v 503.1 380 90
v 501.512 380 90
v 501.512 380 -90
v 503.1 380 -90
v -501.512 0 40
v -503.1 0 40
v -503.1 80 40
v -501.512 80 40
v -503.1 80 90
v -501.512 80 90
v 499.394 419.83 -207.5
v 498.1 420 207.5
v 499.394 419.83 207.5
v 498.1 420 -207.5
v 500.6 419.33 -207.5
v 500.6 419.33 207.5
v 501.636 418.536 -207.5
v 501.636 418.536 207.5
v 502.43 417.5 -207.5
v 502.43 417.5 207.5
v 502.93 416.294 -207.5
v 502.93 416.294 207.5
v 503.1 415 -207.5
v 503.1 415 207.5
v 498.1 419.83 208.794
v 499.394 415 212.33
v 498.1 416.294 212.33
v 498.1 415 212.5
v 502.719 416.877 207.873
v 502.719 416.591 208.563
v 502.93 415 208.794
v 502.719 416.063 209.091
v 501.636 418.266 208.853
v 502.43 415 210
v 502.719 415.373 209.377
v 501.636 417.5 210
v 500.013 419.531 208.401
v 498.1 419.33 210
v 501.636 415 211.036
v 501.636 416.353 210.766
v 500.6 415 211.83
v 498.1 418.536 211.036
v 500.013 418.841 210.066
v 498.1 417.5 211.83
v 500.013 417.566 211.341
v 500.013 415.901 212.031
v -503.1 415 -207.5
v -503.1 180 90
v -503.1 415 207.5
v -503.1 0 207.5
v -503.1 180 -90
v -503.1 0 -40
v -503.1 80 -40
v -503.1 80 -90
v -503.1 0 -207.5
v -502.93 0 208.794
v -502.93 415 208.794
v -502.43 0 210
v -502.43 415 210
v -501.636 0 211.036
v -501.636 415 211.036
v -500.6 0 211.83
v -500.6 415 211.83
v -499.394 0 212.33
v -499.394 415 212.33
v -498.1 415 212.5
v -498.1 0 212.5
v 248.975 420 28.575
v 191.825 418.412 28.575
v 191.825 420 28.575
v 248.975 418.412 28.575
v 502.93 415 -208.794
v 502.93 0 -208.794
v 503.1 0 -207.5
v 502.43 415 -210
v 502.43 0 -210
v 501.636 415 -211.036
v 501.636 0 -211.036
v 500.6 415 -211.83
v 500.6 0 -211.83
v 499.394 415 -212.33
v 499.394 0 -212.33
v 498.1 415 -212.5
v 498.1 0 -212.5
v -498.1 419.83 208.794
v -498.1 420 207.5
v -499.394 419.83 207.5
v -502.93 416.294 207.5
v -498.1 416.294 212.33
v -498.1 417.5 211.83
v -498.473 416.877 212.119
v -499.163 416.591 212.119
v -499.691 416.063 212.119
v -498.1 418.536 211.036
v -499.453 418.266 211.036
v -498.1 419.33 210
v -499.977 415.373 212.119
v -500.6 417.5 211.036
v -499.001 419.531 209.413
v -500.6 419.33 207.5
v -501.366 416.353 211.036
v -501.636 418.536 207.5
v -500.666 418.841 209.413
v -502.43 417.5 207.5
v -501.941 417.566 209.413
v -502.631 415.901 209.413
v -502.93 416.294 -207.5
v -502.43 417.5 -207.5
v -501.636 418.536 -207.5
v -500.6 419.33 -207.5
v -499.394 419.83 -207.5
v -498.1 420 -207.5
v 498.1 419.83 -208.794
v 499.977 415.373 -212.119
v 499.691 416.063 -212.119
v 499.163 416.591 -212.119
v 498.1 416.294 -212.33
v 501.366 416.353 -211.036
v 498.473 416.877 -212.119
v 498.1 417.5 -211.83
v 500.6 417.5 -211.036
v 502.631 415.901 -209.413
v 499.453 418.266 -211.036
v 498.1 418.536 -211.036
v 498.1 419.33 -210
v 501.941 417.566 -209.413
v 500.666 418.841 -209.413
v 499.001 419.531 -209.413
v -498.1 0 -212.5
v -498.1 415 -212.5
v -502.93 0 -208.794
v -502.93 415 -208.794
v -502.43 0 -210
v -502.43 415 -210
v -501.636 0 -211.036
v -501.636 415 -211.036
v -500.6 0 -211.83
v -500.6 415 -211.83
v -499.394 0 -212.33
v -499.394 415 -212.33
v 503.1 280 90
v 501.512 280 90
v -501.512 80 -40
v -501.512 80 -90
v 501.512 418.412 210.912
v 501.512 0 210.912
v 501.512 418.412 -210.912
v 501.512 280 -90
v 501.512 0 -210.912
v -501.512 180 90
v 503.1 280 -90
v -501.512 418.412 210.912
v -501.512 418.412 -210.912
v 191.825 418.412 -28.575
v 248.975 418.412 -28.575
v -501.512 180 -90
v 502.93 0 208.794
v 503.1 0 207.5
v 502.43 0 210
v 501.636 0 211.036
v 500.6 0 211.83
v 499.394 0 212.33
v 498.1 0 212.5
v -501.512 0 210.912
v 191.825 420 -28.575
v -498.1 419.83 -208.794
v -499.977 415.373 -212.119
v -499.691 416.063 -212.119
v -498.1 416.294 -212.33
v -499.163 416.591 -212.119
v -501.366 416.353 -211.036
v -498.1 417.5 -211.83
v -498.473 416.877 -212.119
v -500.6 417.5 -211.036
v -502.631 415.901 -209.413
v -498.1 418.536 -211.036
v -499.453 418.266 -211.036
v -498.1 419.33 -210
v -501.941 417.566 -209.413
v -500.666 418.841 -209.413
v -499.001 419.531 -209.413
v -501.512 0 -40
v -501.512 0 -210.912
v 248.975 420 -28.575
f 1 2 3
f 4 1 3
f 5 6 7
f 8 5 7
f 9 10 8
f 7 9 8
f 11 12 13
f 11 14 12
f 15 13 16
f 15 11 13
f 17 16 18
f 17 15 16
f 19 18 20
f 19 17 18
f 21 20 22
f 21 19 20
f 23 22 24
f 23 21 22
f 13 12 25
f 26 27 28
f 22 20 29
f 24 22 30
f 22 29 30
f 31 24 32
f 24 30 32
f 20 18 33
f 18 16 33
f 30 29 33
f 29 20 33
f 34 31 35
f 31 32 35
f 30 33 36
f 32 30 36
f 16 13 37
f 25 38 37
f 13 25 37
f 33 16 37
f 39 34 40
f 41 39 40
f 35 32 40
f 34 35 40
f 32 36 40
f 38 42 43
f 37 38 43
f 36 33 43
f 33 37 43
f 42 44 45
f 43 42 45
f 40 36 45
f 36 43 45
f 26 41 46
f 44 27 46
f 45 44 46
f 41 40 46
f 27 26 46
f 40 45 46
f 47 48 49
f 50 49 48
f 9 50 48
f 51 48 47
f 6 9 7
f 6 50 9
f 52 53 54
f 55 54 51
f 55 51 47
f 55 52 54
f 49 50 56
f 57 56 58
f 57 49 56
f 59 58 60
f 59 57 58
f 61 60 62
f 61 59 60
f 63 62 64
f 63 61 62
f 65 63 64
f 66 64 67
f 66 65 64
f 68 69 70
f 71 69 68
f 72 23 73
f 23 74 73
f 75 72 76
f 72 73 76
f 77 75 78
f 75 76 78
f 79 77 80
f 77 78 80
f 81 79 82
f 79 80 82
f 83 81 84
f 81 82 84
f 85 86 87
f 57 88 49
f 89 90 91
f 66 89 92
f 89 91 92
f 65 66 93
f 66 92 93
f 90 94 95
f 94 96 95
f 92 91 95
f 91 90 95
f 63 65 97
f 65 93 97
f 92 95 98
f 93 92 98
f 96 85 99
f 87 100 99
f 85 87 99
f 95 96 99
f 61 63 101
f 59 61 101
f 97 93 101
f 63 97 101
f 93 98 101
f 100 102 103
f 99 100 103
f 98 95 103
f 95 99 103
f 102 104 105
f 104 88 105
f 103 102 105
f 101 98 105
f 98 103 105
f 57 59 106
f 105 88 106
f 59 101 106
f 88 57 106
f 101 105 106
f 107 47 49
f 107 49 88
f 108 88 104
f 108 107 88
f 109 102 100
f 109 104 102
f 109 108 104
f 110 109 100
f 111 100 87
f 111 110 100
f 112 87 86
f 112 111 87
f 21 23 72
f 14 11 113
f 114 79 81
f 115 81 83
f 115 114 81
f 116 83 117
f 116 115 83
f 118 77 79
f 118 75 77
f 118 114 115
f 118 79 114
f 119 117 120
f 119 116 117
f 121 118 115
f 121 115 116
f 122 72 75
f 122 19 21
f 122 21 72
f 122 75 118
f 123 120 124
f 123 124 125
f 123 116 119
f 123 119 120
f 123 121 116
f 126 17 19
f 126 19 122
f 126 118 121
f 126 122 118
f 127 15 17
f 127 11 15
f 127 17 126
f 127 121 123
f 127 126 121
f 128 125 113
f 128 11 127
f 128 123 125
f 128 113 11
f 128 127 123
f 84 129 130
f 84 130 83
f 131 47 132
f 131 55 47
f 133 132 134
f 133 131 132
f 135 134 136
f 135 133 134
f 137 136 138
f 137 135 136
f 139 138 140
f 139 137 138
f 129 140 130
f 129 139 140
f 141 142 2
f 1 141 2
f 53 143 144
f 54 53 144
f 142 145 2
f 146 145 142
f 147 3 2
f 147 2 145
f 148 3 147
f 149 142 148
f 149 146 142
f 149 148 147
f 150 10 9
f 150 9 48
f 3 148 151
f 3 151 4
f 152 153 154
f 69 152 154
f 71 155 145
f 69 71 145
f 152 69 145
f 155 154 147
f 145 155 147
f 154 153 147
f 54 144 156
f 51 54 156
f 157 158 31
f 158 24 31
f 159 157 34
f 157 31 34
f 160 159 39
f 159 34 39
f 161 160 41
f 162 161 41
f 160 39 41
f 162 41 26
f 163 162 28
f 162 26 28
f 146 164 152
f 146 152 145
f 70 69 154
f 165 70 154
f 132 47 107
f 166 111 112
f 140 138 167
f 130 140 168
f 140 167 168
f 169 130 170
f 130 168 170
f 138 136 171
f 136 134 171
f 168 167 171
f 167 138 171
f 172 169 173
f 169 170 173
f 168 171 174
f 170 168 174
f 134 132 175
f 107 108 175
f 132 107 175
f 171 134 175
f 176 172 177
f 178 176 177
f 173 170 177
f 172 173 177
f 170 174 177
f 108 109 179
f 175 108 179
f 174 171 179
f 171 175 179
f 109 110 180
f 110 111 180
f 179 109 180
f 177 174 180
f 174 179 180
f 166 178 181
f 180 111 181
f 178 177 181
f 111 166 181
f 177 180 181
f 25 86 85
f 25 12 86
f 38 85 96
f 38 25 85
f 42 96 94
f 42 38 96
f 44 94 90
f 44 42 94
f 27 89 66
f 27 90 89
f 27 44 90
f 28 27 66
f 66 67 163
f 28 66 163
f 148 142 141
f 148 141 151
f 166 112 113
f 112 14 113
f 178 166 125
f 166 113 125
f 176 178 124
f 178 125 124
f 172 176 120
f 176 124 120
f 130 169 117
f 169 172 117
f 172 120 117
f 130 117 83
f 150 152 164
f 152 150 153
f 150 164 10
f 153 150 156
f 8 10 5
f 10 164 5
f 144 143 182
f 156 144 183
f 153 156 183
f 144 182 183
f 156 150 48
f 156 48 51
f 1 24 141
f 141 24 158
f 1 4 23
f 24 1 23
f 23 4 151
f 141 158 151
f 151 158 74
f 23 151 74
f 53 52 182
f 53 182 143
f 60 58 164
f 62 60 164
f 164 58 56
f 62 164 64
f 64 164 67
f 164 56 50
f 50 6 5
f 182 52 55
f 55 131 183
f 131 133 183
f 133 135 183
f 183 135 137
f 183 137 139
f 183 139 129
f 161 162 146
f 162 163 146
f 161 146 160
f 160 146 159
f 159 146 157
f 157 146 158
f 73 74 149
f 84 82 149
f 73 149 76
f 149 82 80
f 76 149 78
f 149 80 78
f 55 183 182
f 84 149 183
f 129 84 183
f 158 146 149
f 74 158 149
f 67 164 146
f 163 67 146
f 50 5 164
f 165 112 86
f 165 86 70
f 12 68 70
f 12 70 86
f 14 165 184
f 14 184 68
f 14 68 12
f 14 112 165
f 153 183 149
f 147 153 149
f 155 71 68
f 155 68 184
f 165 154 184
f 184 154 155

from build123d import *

# Parameters (mm, degrees)
SKETCH2_W           = 1006.2
SKETCH2_H           = 425
SKETCH2_W_2         = 1003.025
SKETCH2_H_2         = 421.825
BOSS_EXTRUDE1_DEPTH = 420
BOSS_EXTRUDE2_START = 420
SKETCH3_W           = 1006.2
SKETCH3_H           = 425
BOSS_EXTRUDE2_DEPTH = 1.5875
FILLET2_R           = 5
CUT_EXTRUDE1_REACH  = 1112.853
SKETCH4_W           = 80
SKETCH4_H           = 80
SKETCH7_W           = 57.15
SKETCH7_H           = 57.15
CUT_EXTRUDE2_DEPTH  = 420
SKETCH8_W           = 180
SKETCH8_H           = 100
CUT_EXTRUDE3_DEPTH  = 503.1
SKETCH9_W           = 180
SKETCH9_H           = 100
CUT_EXTRUDE4_DEPTH  = 503.1


with BuildPart() as part:
    # Sketch2 → Boss-Extrude1 (new body)
    with BuildSketch(Plane(origin=(0, 0, 0), x_dir=(1, 0, 0), z_dir=(0, 1, 0))):
        Rectangle(SKETCH2_W, SKETCH2_H)
        Rectangle(SKETCH2_W_2, SKETCH2_H_2, mode=Mode.SUBTRACT)
    extrude(amount=BOSS_EXTRUDE1_DEPTH)

    # Sketch3 → Boss-Extrude2 (add)
    with BuildSketch(Plane(origin=(0, 0, 0), x_dir=(1, 0, 0), z_dir=(0, 1, 0)).offset(BOSS_EXTRUDE2_START)):
        Rectangle(SKETCH3_W, SKETCH3_H)
    extrude(amount=-BOSS_EXTRUDE2_DEPTH)

    # Fillet2
    fillet2_edges = [part.edges().sort_by_distance(p)[0] for p in [
        (-503.1, 420, 0),
        (0, 420, 212.5),
        (503.1, 420, 0),
        (503.1, 210, 212.5),
        (-503.1, 210, 212.5),
        (-503.1, 210, -212.5),
        (503.1, 210, -212.5),
        (0, 420, -212.5),
    ]]
    fillet(fillet2_edges, radius=FILLET2_R)

    # Sketch4 → Cut-Extrude1 (cut, up to next)
    with BuildSketch(Plane.ZY.offset(503.1), mode=Mode.PRIVATE) as cut_extrude1_sk1:
        with Locations((0, 40)):
            Rectangle(SKETCH4_W, SKETCH4_H)
    cut_extrude1_tool1 = extrude(cut_extrude1_sk1.sketch, amount=-CUT_EXTRUDE1_REACH, mode=Mode.PRIVATE) & part.part
    add(cut_extrude1_tool1.solids().sort_by_distance((-503.1, 40, 0))[0], mode=Mode.SUBTRACT)

    # Sketch7 → Cut-Extrude2 (cut)
    with BuildSketch(Plane(origin=(0, 0, 0), x_dir=(1, 0, 0), z_dir=(0, 1, 0))):
        with Locations((220.4, 0)):
            Rectangle(SKETCH7_W, SKETCH7_H)
    extrude(amount=CUT_EXTRUDE2_DEPTH, mode=Mode.SUBTRACT)

    # Sketch8 → Cut-Extrude3 (cut)
    with BuildSketch(Plane(origin=(0, 0, 0), x_dir=(0, 0, -1), z_dir=(1, 0, 0))):
        with Locations((0, 330)):
            Rectangle(SKETCH8_W, SKETCH8_H)
    extrude(amount=CUT_EXTRUDE3_DEPTH, mode=Mode.SUBTRACT)

    # Sketch9 → Cut-Extrude4 (cut)
    with BuildSketch(Plane(origin=(0, 0, 0), x_dir=(0, 0, -1), z_dir=(1, 0, 0))):
        with Locations((0, 130)):
            Rectangle(SKETCH9_W, SKETCH9_H)
    extrude(amount=-CUT_EXTRUDE4_DEPTH, mode=Mode.SUBTRACT)


solid = part.part
